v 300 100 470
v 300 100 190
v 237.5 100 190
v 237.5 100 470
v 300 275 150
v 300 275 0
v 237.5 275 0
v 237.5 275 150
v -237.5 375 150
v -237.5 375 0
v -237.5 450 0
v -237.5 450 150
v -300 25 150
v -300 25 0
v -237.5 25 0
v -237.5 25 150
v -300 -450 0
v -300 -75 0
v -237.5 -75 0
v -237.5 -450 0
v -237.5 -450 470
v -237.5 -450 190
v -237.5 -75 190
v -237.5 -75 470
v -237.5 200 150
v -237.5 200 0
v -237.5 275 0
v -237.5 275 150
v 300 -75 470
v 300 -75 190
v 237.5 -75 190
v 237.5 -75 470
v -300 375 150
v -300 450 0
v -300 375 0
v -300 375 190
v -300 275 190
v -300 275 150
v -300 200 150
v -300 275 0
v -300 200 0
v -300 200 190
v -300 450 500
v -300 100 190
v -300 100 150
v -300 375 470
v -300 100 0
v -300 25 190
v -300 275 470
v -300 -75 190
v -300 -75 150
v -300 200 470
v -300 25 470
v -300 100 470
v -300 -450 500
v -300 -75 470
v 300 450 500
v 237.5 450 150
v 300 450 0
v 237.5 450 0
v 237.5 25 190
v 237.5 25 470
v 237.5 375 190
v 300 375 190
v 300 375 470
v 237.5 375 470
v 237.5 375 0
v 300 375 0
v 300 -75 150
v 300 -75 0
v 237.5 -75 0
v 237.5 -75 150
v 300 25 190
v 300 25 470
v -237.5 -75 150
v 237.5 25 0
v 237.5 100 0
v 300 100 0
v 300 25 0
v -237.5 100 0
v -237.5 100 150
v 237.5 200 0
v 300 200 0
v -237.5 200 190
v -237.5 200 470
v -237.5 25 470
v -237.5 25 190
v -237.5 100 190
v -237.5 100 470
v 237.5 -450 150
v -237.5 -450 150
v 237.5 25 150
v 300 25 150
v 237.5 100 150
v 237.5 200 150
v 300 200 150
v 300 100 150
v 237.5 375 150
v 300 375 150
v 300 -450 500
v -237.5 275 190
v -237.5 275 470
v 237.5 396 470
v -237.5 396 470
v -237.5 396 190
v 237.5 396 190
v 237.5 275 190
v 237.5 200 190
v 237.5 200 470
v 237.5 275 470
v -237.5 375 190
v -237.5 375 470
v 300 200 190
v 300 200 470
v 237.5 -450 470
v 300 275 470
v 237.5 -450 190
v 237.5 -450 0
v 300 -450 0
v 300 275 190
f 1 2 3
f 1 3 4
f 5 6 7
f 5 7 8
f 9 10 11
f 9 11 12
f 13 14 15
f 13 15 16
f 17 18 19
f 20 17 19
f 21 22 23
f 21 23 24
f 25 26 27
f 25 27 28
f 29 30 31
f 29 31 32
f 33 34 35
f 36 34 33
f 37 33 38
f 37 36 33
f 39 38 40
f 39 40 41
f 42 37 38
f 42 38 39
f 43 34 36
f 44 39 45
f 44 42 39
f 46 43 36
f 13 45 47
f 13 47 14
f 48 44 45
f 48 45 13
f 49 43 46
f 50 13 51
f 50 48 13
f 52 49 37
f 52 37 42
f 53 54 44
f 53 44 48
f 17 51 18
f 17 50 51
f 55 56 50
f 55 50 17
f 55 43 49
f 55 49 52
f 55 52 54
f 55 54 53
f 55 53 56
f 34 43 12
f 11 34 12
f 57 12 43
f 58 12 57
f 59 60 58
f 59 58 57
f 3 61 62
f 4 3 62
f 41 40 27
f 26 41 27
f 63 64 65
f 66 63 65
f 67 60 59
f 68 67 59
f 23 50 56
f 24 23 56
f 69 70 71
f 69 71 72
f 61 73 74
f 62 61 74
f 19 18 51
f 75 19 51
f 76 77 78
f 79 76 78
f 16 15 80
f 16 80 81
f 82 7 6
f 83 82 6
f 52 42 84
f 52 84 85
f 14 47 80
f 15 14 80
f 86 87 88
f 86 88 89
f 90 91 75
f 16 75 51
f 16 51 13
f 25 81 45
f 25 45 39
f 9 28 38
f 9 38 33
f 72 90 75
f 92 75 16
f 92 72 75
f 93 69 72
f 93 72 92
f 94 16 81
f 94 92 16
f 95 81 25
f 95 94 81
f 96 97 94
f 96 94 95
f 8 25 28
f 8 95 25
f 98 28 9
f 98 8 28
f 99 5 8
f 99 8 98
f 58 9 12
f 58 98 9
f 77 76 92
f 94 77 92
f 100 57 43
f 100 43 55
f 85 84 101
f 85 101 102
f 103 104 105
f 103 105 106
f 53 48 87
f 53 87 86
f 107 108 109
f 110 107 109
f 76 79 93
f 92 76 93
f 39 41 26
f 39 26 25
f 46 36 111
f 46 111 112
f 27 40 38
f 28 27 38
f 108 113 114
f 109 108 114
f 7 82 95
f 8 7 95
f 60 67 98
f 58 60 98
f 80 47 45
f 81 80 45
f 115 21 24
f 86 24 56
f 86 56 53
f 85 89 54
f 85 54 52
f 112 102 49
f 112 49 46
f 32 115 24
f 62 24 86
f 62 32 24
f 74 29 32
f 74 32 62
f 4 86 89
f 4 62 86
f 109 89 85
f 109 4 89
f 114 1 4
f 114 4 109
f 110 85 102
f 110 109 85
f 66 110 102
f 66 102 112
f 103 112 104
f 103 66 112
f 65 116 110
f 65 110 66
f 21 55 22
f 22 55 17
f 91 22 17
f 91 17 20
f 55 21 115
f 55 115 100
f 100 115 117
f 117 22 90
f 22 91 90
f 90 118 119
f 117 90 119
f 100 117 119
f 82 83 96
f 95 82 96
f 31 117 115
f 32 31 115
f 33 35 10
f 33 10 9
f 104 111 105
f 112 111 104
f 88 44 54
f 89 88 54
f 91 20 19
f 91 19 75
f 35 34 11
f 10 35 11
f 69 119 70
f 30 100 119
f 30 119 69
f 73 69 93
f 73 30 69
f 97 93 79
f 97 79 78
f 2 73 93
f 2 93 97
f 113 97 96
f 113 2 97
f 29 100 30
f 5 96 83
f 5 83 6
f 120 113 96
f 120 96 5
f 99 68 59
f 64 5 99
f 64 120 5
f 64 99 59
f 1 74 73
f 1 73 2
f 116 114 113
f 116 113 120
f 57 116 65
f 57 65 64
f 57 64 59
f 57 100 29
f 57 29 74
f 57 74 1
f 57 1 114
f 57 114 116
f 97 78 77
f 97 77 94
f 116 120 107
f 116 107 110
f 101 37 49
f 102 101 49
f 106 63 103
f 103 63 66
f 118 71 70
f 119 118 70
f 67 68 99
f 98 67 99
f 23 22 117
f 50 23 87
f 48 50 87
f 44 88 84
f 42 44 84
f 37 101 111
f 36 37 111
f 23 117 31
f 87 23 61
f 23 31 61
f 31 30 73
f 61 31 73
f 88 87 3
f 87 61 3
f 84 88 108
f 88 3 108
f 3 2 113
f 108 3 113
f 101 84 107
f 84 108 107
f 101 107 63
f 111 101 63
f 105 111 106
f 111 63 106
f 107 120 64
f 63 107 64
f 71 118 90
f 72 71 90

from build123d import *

# Parameters (mm, degrees)
F0_W      = 600
F0_H      = 900
F1_DEPTH  = 500
F2_W      = 475
F2_H      = 150
F3_DEPTH  = 1705
F4_W      = 475
F4_H      = 280
F5_DEPTH  = 846
F6_W      = 100
F6_H      = 500
F7_DEPTH  = 63
F8_DEPTH  = 63
F9_DEPTH  = 63
F10_DEPTH = 63
F11_DEPTH = 63
F13_W     = 100
F13_H     = 500
F14_DEPTH = 63
F15_DEPTH = 63
F16_DEPTH = 63


with BuildPart() as f1:
    # F0 (on Top) → F1 (new body)
    with BuildSketch(Plane.XY):
        Rectangle(F0_W, F0_H)
    extrude(amount=F1_DEPTH)

    # F2 (on face) → F3 (cut)
    with BuildSketch(Plane.XZ.offset(450)):
        with Locations((0, 75)):
            Rectangle(F2_W, F2_H)
    extrude(amount=-F3_DEPTH, mode=Mode.SUBTRACT)

    # F4 (on face) → F5 (cut)
    with BuildSketch(Plane.XZ.offset(450)):
        with Locations((0, 330)):
            Rectangle(F4_W, F4_H)
    extrude(amount=-F5_DEPTH, mode=Mode.SUBTRACT)

    # F6 (on face) → F7 (cut)
    with BuildSketch(Plane.YZ.offset(300)):
        with Locations((-25, 250)):
            Rectangle(F6_W, F6_H)
    extrude(amount=-F7_DEPTH, mode=Mode.SUBTRACT)

    # F8 (add): a face of the model
    f8_faces = [f1.faces().sort_by_distance(p)[0] for p in [
        (237, -25, 485),
    ]]
    extrude(f8_faces, amount=F8_DEPTH)

    # F9 (add): a face of the model
    f9_faces = [f1.faces().sort_by_distance(p)[0] for p in [
        (237, -25, 170),
    ]]
    extrude(f9_faces, amount=F9_DEPTH)

    # F6 (on face) → F10 (cut)
    with BuildSketch(Plane.YZ.offset(300)):
        with Locations((325, 250)):
            Rectangle(F6_W, F6_H)
        with Locations((150, 250)):
            Rectangle(F6_W, F6_H)
        with Locations((-25, 250)):
            Rectangle(F6_W, F6_H)
    extrude(amount=-F10_DEPTH, mode=Mode.SUBTRACT)

    # F11 (add): faces of the model
    f11_faces = [f1.faces().sort_by_distance(p)[0] for p in [
        (237, -25, 485),
        (237, 150, 485),
        (237, 325, 485),
        (237, 325, 170),
        (237, 150, 170),
        (237, -25, 170),
    ]]
    extrude(f11_faces, amount=F11_DEPTH)

    # F13 (on face) → F14 (cut)
    with BuildSketch(Plane(origin=(-300, 0, 0), x_dir=(0, -1, 0), z_dir=(-1, 0, 0))):
        with Locations((-325, 250)):
            Rectangle(F13_W, F13_H)
        with Locations((-150, 250)):
            Rectangle(F13_W, F13_H)
        with Locations((25, 250)):
            Rectangle(F13_W, F13_H)
    extrude(amount=-F14_DEPTH, mode=Mode.SUBTRACT)

    # F15 (add): faces of the model
    f15_faces = [f1.faces().sort_by_distance(p)[0] for p in [
        (-237, 325, 485),
        (-237, 150, 485),
        (-237, -25, 485),
    ]]
    extrude(f15_faces, amount=F15_DEPTH)

    # F16 (add): faces of the model
    f16_faces = [f1.faces().sort_by_distance(p)[0] for p in [
        (-237, 325, 170),
        (-237, 150, 170),
        (-237, -25, 170),
    ]]
    extrude(f16_faces, amount=F16_DEPTH)


solid = f1.part
